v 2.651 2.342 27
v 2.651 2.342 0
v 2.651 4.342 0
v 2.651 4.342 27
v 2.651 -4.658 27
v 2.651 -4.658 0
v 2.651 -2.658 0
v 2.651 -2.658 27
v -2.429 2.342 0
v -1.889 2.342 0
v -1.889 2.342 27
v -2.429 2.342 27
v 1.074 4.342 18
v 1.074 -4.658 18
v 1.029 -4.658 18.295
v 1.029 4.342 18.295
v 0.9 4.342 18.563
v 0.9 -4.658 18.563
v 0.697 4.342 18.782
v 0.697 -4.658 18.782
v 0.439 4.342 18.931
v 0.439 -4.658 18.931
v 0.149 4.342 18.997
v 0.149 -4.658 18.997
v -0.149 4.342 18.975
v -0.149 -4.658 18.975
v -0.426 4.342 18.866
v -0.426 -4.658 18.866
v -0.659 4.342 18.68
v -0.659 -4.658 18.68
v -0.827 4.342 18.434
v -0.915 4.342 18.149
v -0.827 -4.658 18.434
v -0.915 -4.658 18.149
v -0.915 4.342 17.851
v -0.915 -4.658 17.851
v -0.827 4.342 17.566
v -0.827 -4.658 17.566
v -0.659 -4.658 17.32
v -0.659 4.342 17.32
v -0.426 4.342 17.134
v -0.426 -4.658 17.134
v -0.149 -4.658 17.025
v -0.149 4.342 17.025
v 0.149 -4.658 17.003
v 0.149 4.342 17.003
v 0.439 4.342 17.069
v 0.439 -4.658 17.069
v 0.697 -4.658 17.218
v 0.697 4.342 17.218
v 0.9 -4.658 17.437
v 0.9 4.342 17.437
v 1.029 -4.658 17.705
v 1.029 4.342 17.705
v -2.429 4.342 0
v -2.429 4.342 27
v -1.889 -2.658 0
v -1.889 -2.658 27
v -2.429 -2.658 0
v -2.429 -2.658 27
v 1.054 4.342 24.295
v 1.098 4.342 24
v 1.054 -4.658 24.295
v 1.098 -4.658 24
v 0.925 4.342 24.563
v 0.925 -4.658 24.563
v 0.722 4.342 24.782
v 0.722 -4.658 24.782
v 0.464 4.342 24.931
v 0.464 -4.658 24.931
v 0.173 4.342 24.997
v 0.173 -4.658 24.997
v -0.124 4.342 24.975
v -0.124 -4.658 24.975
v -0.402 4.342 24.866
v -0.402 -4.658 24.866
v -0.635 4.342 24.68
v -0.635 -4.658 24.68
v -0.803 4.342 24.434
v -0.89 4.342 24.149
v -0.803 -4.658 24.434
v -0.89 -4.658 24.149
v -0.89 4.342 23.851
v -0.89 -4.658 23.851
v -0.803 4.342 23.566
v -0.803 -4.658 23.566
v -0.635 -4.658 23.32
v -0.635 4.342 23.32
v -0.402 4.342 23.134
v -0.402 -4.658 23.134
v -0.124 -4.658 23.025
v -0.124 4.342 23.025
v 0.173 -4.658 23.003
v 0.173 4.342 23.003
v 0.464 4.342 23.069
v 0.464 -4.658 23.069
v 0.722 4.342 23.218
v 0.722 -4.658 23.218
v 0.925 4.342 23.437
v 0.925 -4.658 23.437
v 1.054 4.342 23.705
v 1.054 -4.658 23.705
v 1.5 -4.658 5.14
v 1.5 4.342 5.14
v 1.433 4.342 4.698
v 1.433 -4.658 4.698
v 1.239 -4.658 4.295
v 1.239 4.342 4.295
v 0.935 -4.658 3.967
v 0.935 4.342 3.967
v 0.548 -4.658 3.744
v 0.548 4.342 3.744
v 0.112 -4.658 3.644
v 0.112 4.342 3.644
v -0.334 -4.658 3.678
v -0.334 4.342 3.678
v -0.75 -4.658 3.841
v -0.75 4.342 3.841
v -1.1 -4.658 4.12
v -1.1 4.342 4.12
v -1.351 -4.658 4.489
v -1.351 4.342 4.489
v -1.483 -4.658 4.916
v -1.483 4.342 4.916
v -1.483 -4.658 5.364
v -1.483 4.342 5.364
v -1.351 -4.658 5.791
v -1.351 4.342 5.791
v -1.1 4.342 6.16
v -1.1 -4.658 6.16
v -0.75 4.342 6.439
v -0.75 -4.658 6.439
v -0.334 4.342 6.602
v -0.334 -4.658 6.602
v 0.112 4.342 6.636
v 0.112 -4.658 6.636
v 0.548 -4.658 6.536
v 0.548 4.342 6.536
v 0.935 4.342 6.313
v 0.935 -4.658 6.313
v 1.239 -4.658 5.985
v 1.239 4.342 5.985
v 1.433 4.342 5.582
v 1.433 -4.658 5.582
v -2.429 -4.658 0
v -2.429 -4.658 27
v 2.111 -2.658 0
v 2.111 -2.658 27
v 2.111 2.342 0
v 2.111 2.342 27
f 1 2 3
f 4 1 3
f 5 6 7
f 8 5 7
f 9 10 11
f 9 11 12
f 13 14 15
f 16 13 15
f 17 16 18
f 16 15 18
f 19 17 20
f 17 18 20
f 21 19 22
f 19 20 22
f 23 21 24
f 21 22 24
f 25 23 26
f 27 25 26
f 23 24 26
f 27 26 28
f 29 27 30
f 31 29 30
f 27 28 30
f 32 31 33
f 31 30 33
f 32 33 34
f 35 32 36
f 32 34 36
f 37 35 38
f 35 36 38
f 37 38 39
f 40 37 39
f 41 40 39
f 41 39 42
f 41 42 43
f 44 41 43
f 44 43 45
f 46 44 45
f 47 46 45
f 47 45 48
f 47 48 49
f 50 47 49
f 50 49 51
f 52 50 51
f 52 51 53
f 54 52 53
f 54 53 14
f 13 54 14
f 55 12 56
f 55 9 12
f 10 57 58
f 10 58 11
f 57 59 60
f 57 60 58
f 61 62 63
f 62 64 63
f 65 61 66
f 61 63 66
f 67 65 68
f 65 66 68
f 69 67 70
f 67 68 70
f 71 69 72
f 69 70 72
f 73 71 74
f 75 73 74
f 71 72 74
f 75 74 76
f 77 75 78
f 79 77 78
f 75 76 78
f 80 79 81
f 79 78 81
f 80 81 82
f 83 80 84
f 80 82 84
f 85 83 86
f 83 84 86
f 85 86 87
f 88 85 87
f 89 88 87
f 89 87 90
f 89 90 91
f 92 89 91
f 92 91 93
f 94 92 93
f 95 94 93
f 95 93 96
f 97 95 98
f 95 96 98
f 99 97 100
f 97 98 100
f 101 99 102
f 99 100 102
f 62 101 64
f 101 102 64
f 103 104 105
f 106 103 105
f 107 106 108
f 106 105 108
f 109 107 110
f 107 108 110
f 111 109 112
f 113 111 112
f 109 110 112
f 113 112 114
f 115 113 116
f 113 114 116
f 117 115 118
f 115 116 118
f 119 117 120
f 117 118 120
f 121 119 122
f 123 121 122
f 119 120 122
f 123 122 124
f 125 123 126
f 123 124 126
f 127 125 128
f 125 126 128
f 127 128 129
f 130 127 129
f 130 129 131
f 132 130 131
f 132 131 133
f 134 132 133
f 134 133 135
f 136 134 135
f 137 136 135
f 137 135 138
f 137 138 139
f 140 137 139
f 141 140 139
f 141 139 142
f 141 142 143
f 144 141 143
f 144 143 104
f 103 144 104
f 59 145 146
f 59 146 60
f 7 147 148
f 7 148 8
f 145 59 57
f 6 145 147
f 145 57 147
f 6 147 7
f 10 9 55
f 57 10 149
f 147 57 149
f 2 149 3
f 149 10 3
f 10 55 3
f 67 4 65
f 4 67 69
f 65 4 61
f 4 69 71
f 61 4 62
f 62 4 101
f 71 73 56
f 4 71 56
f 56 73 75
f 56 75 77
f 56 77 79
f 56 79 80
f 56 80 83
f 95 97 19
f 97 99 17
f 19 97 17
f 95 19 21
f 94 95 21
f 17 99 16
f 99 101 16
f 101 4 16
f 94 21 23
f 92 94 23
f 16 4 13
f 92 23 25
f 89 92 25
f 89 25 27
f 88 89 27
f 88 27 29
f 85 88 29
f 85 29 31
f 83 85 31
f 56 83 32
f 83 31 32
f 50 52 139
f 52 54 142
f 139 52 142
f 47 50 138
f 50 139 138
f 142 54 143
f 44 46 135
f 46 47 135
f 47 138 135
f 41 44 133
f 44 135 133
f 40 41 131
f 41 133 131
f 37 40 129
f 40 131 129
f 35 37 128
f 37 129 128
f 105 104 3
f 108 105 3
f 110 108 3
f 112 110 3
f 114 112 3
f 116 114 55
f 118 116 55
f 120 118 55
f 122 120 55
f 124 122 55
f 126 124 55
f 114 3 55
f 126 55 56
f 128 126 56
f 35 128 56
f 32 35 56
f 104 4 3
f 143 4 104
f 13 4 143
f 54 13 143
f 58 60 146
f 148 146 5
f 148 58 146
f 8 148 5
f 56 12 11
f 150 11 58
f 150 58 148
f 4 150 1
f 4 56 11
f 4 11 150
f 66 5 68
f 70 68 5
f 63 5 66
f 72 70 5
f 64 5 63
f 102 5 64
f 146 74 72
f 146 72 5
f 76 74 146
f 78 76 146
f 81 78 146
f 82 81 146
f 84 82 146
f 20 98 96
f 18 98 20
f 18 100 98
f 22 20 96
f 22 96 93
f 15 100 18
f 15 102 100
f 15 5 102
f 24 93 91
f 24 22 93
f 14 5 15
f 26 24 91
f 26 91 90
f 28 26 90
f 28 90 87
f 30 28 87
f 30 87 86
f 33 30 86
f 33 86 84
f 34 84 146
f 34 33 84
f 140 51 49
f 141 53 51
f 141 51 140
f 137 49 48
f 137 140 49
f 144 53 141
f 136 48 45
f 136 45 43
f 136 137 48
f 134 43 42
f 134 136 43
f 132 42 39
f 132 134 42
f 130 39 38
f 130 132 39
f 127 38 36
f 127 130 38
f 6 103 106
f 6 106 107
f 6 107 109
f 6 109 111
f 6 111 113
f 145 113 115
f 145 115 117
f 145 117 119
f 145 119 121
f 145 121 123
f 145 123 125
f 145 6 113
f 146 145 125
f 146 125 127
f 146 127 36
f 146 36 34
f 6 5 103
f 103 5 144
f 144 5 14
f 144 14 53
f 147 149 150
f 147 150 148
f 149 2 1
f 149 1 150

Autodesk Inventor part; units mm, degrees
ref_plane "YZ Plane" through (0, 0, 0) normal (1, 0, 0) x (0, 1, 0)
ref_plane "XZ Plane" through (0, 0, 0) normal (0, 1, 0) x (-1, 0, 0)
ref_plane "XY Plane" through (0, 0, 0) normal (0, 0, 1) x (1, 0, 0)
sketch "Sketch1" plane through (0, 0, 0) normal (0, 0, 1) x (1, 0, 0)
  line L0 (2.1107, -2.6582) -> (2.6507, -2.6582)
  line L1 (2.6507, 2.3418) -> (2.1107, 2.3418)
  line L2 (-1.8893, -2.6582) -> (-1.8893, 2.3418)
  line L3 (-2.4293, -2.6582) -> (-1.8893, -2.6582)
  line L4 (-1.8893, 2.3418) -> (-2.4293, 2.3418)
  line L5 (2.6507, -4.6582) -> (2.6507, -2.6582)
  line L6 (2.6507, -4.6582) -> (1.9068, -4.6582)
  line L7 (0.1107, 4.3418) -> (-1.6853, 4.3418)
  line L8 (-2.4293, 2.3418) -> (-2.4293, 4.3418)
  line L9 (-1.6853, 4.3418) -> (-2.4293, 4.3418)
  line L10 (2.6507, -4.6582) -> (1.9068, -4.6582)
  line L11 (1.9068, -4.6582) -> (1.9068, 4.3418)
  line L12 (2.6507, 4.3418) -> (1.9068, 4.3418)
  line L13 (2.6507, 2.3418) -> (2.6507, 4.3418)
  line L14 (2.6507, 2.3418) -> (2.1107, 2.3418)
  line L15 (2.1107, 2.3418) -> (2.1107, -2.6582)
  line L16 (2.1107, -2.6582) -> (2.6507, -2.6582)
  line L17 (2.6507, -4.6582) -> (2.6507, -2.6582)
  line L18 (-1.6853, -4.6582) -> (-1.6853, 4.3418)
  line L19 (-1.6853, -4.6582) -> (-2.4293, -4.6582)
  line L20 (-2.4293, -4.6582) -> (-2.4293, -2.6582)
  line L21 (-2.4293, -2.6582) -> (-1.8893, -2.6582)
  line L22 (-1.8893, -2.6582) -> (-1.8893, 2.3418)
  line L23 (-1.8893, 2.3418) -> (-2.4293, 2.3418)
  line L24 (-2.4293, 2.3418) -> (-2.4293, 4.3418)
  line L25 (-1.6853, 4.3418) -> (-2.4293, 4.3418)
  line L26 (-1.6853, -4.6582) -> (-1.6853, 4.3418)
  line L27 (2.6507, -4.6582) -> (-2.4293, -4.6582)
  line L28 (2.1107, 2.3418) -> (2.1107, -2.6582)
  line L29 (-1.6853, -4.6582) -> (-2.4293, -4.6582)
  line L30 (2.6507, -4.6582) -> (-2.4293, -4.6582)
  line L31 (2.6507, -2.6582) -> (2.1107, -2.6582)
  line L32 (2.1107, -2.6582) -> (2.1107, 2.3418)
  line L33 (2.1107, 2.3418) -> (2.6507, 2.3418)
  line L34 (2.6507, 2.3418) -> (2.6507, 4.3418)
  line L35 (-2.4293, 4.3418) -> (2.6507, 4.3418)
  line L36 (-2.4293, 2.3418) -> (-2.4293, 4.3418)
  line L37 (-2.4293, 2.3418) -> (-1.8893, 2.3418)
  line L38 (-1.8893, 2.3418) -> (-1.8893, -2.6582)
  line L39 (-1.8893, -2.6582) -> (-2.4293, -2.6582)
  line L40 (-2.4293, -4.6582) -> (-2.4293, -2.6582)
  line L41 (2.6507, -4.6582) -> (-2.4293, -4.6582)
  line L42 (2.6507, -2.6582) -> (2.6507, -4.6582)
  line L43 (-1.3893, 4.3418) -> (1.6107, 4.3418)
  line L44 (1.9068, 4.3418) -> (0.1107, 4.3418)
  line L45 (0.1107, 4.3418) -> (-1.6853, 4.3418)
  line L46 (-1.6853, 4.3418) -> (-2.4293, 4.3418)
  line L47 (-2.4293, 4.3418) -> (2.6507, 4.3418)
  line L48 (2.6507, 4.3418) -> (1.9068, 4.3418)
  line L49 (2.6507, -4.6582) -> (-2.4293, -4.6582)
  line L50 (2.6507, -4.6582) -> (-2.4293, -4.6582)
  line L51 (2.6507, 2.3418) -> (2.6507, 4.3418)
  line L52 (2.1107, 2.3418) -> (2.6507, 2.3418)
  line L53 (2.6507, 2.3418) -> (2.6507, 4.3418)
  line L54 (2.6507, -2.6582) -> (2.1107, -2.6582)
  line L55 (2.6507, 2.3418) -> (2.6507, 4.3418)
  line L56 (2.6507, 2.3418) -> (2.6507, 4.3418)
  line L57 (2.6507, -2.6582) -> (2.6507, -4.6582)
  line L58 (2.6507, -4.6582) -> (2.6507, -2.6582)
  line L59 (2.6507, 2.3418) -> (2.1107, 2.3418)
  line L60 (2.1107, 2.3418) -> (2.6507, 2.3418)
  line L61 (2.1107, -2.6582) -> (2.6507, -2.6582)
  line L62 (2.6507, -2.6582) -> (2.1107, -2.6582)
  line L63 (2.1107, 2.3418) -> (2.1107, -2.6582)
  line L64 (2.1107, -2.6582) -> (2.1107, 2.3418)
  line L65 (-2.4293, -4.6582) -> (-2.4293, -2.6582)
  line L66 (2.6507, 4.3418) -> (1.9068, 4.3418)
  line L67 (-2.4293, 2.3418) -> (-2.4293, 4.3418)
  line L68 (-2.4293, -4.6582) -> (-2.4293, -2.6582)
  line L69 (-1.8893, -2.6582) -> (-2.4293, -2.6582)
  line L70 (-2.4293, 2.3418) -> (-1.8893, 2.3418)
  line L71 (-1.8893, -2.6582) -> (-1.8893, 2.3418)
  line L72 (-1.8893, 2.3418) -> (-1.8893, -2.6582)
  line L73 (-1.8893, -2.6582) -> (-2.4293, -2.6582)
  line L74 (-2.4293, -2.6582) -> (-1.8893, -2.6582)
  line L75 (-1.8893, 2.3418) -> (-2.4293, 2.3418)
  line L76 (-2.4293, 2.3418) -> (-1.8893, 2.3418)
  line L77 (-2.4293, -4.6582) -> (-2.4293, -2.6582)
  line L78 (-2.4293, -4.6582) -> (-2.4293, -2.6582)
  line L79 (-2.4293, 2.3418) -> (-2.4293, 4.3418)
  line L80 (-2.4293, 2.3418) -> (-2.4293, 4.3418)
  line L81 (-2.4293, 4.3418) -> (2.6507, 4.3418)
  line L82 (-1.8893, 2.3418) -> (-1.8893, -2.6582)
  line L83 (2.6507, -2.6582) -> (2.6507, -4.6582)
  line L84 (1.9068, -4.6582) -> (1.9068, 4.3418)
  line L85 (-1.3893, -3.6582) -> (1.6107, -3.6582)
  line L86 (-1.3893, -3.6582) -> (1.6107, -3.6582)
  line L87 (-1.3893, 4.3418) -> (1.6107, 4.3418)
  line L88 (-1.3893, -3.6582) -> (1.6107, -3.6582)
  line L89 (-1.3893, 4.3418) -> (1.6107, 4.3418)
  line L90 (2.1107, -2.6582) -> (2.1107, 2.3418)
  line L91 (1.9068, 4.3418) -> (0.1107, 4.3418)
  line L92 (2.6507, 2.8418) -> (-2.4293, 2.8418)
  line L93 (2.6507, 2.8418) -> (-2.4293, 2.8418)
  line L94 (-2.4293, 2.8418) -> (2.6507, 2.8418)
  line L95 (2.6507, 2.8418) -> (-2.4293, 2.8418)
  point P0 (0, 0)
  point P1 (0.1107, 2.8418)
  point P2 (0.1107, 2.8418)
  point P3 (0.1107, 2.8418)
  point P4 (-2.4293, 2.8418)
  point P5 (2.6507, 2.8418)
  point P6 (2.6507, 2.8418)
  point P7 (0.1107, 2.8418)
  point P8 (0.1107, 2.8418)
  point P9 (0.1107, 2.8418)
  point P10 (0.1107, 2.8418)
extrude "Extrusion1" add sketch "Sketch1" along normal blind 27
sketch "Sketch2" plane through (-2.4293, 4.3418, 0) normal (0, 1, 0) x (1, 0, 0)
  line L0 (0, -27) -> (5.08, -27) projected
  circle A0 centre (2.4293, -5.14) radius 1.5
  point P0 (2.4293, 0)
  point P1 (2.54, -27)
  point P2 (2.4293, 0)
  dimension "d2" = 21.86
  dimension "d3" = 3
extrude "Extrusion2" cut sketch "Sketch2" against normal blind 27
sketch "Sketch3" plane through (-2.4293, -4.6582, 0) normal (0, -1, 0) x (1, 0, 0)
  line L0 (5.08, 27) -> (0, 27) projected
  line L1 (2.54, 27) -> (2.4293, 0)
  circle A0 centre (2.5277, 24) radius 1
  circle A1 centre (2.5031, 18) radius 1
  dimension "d6" = 2
  dimension "d7" = 2
  dimension "d8" = 3
  dimension "d9" = 9
  dimension "d10" = 5.08
extrude "Extrusion3" cut sketch "Sketch3" against normal blind 27
properties part number "UpperGripperfingerpart_3DPrint"
